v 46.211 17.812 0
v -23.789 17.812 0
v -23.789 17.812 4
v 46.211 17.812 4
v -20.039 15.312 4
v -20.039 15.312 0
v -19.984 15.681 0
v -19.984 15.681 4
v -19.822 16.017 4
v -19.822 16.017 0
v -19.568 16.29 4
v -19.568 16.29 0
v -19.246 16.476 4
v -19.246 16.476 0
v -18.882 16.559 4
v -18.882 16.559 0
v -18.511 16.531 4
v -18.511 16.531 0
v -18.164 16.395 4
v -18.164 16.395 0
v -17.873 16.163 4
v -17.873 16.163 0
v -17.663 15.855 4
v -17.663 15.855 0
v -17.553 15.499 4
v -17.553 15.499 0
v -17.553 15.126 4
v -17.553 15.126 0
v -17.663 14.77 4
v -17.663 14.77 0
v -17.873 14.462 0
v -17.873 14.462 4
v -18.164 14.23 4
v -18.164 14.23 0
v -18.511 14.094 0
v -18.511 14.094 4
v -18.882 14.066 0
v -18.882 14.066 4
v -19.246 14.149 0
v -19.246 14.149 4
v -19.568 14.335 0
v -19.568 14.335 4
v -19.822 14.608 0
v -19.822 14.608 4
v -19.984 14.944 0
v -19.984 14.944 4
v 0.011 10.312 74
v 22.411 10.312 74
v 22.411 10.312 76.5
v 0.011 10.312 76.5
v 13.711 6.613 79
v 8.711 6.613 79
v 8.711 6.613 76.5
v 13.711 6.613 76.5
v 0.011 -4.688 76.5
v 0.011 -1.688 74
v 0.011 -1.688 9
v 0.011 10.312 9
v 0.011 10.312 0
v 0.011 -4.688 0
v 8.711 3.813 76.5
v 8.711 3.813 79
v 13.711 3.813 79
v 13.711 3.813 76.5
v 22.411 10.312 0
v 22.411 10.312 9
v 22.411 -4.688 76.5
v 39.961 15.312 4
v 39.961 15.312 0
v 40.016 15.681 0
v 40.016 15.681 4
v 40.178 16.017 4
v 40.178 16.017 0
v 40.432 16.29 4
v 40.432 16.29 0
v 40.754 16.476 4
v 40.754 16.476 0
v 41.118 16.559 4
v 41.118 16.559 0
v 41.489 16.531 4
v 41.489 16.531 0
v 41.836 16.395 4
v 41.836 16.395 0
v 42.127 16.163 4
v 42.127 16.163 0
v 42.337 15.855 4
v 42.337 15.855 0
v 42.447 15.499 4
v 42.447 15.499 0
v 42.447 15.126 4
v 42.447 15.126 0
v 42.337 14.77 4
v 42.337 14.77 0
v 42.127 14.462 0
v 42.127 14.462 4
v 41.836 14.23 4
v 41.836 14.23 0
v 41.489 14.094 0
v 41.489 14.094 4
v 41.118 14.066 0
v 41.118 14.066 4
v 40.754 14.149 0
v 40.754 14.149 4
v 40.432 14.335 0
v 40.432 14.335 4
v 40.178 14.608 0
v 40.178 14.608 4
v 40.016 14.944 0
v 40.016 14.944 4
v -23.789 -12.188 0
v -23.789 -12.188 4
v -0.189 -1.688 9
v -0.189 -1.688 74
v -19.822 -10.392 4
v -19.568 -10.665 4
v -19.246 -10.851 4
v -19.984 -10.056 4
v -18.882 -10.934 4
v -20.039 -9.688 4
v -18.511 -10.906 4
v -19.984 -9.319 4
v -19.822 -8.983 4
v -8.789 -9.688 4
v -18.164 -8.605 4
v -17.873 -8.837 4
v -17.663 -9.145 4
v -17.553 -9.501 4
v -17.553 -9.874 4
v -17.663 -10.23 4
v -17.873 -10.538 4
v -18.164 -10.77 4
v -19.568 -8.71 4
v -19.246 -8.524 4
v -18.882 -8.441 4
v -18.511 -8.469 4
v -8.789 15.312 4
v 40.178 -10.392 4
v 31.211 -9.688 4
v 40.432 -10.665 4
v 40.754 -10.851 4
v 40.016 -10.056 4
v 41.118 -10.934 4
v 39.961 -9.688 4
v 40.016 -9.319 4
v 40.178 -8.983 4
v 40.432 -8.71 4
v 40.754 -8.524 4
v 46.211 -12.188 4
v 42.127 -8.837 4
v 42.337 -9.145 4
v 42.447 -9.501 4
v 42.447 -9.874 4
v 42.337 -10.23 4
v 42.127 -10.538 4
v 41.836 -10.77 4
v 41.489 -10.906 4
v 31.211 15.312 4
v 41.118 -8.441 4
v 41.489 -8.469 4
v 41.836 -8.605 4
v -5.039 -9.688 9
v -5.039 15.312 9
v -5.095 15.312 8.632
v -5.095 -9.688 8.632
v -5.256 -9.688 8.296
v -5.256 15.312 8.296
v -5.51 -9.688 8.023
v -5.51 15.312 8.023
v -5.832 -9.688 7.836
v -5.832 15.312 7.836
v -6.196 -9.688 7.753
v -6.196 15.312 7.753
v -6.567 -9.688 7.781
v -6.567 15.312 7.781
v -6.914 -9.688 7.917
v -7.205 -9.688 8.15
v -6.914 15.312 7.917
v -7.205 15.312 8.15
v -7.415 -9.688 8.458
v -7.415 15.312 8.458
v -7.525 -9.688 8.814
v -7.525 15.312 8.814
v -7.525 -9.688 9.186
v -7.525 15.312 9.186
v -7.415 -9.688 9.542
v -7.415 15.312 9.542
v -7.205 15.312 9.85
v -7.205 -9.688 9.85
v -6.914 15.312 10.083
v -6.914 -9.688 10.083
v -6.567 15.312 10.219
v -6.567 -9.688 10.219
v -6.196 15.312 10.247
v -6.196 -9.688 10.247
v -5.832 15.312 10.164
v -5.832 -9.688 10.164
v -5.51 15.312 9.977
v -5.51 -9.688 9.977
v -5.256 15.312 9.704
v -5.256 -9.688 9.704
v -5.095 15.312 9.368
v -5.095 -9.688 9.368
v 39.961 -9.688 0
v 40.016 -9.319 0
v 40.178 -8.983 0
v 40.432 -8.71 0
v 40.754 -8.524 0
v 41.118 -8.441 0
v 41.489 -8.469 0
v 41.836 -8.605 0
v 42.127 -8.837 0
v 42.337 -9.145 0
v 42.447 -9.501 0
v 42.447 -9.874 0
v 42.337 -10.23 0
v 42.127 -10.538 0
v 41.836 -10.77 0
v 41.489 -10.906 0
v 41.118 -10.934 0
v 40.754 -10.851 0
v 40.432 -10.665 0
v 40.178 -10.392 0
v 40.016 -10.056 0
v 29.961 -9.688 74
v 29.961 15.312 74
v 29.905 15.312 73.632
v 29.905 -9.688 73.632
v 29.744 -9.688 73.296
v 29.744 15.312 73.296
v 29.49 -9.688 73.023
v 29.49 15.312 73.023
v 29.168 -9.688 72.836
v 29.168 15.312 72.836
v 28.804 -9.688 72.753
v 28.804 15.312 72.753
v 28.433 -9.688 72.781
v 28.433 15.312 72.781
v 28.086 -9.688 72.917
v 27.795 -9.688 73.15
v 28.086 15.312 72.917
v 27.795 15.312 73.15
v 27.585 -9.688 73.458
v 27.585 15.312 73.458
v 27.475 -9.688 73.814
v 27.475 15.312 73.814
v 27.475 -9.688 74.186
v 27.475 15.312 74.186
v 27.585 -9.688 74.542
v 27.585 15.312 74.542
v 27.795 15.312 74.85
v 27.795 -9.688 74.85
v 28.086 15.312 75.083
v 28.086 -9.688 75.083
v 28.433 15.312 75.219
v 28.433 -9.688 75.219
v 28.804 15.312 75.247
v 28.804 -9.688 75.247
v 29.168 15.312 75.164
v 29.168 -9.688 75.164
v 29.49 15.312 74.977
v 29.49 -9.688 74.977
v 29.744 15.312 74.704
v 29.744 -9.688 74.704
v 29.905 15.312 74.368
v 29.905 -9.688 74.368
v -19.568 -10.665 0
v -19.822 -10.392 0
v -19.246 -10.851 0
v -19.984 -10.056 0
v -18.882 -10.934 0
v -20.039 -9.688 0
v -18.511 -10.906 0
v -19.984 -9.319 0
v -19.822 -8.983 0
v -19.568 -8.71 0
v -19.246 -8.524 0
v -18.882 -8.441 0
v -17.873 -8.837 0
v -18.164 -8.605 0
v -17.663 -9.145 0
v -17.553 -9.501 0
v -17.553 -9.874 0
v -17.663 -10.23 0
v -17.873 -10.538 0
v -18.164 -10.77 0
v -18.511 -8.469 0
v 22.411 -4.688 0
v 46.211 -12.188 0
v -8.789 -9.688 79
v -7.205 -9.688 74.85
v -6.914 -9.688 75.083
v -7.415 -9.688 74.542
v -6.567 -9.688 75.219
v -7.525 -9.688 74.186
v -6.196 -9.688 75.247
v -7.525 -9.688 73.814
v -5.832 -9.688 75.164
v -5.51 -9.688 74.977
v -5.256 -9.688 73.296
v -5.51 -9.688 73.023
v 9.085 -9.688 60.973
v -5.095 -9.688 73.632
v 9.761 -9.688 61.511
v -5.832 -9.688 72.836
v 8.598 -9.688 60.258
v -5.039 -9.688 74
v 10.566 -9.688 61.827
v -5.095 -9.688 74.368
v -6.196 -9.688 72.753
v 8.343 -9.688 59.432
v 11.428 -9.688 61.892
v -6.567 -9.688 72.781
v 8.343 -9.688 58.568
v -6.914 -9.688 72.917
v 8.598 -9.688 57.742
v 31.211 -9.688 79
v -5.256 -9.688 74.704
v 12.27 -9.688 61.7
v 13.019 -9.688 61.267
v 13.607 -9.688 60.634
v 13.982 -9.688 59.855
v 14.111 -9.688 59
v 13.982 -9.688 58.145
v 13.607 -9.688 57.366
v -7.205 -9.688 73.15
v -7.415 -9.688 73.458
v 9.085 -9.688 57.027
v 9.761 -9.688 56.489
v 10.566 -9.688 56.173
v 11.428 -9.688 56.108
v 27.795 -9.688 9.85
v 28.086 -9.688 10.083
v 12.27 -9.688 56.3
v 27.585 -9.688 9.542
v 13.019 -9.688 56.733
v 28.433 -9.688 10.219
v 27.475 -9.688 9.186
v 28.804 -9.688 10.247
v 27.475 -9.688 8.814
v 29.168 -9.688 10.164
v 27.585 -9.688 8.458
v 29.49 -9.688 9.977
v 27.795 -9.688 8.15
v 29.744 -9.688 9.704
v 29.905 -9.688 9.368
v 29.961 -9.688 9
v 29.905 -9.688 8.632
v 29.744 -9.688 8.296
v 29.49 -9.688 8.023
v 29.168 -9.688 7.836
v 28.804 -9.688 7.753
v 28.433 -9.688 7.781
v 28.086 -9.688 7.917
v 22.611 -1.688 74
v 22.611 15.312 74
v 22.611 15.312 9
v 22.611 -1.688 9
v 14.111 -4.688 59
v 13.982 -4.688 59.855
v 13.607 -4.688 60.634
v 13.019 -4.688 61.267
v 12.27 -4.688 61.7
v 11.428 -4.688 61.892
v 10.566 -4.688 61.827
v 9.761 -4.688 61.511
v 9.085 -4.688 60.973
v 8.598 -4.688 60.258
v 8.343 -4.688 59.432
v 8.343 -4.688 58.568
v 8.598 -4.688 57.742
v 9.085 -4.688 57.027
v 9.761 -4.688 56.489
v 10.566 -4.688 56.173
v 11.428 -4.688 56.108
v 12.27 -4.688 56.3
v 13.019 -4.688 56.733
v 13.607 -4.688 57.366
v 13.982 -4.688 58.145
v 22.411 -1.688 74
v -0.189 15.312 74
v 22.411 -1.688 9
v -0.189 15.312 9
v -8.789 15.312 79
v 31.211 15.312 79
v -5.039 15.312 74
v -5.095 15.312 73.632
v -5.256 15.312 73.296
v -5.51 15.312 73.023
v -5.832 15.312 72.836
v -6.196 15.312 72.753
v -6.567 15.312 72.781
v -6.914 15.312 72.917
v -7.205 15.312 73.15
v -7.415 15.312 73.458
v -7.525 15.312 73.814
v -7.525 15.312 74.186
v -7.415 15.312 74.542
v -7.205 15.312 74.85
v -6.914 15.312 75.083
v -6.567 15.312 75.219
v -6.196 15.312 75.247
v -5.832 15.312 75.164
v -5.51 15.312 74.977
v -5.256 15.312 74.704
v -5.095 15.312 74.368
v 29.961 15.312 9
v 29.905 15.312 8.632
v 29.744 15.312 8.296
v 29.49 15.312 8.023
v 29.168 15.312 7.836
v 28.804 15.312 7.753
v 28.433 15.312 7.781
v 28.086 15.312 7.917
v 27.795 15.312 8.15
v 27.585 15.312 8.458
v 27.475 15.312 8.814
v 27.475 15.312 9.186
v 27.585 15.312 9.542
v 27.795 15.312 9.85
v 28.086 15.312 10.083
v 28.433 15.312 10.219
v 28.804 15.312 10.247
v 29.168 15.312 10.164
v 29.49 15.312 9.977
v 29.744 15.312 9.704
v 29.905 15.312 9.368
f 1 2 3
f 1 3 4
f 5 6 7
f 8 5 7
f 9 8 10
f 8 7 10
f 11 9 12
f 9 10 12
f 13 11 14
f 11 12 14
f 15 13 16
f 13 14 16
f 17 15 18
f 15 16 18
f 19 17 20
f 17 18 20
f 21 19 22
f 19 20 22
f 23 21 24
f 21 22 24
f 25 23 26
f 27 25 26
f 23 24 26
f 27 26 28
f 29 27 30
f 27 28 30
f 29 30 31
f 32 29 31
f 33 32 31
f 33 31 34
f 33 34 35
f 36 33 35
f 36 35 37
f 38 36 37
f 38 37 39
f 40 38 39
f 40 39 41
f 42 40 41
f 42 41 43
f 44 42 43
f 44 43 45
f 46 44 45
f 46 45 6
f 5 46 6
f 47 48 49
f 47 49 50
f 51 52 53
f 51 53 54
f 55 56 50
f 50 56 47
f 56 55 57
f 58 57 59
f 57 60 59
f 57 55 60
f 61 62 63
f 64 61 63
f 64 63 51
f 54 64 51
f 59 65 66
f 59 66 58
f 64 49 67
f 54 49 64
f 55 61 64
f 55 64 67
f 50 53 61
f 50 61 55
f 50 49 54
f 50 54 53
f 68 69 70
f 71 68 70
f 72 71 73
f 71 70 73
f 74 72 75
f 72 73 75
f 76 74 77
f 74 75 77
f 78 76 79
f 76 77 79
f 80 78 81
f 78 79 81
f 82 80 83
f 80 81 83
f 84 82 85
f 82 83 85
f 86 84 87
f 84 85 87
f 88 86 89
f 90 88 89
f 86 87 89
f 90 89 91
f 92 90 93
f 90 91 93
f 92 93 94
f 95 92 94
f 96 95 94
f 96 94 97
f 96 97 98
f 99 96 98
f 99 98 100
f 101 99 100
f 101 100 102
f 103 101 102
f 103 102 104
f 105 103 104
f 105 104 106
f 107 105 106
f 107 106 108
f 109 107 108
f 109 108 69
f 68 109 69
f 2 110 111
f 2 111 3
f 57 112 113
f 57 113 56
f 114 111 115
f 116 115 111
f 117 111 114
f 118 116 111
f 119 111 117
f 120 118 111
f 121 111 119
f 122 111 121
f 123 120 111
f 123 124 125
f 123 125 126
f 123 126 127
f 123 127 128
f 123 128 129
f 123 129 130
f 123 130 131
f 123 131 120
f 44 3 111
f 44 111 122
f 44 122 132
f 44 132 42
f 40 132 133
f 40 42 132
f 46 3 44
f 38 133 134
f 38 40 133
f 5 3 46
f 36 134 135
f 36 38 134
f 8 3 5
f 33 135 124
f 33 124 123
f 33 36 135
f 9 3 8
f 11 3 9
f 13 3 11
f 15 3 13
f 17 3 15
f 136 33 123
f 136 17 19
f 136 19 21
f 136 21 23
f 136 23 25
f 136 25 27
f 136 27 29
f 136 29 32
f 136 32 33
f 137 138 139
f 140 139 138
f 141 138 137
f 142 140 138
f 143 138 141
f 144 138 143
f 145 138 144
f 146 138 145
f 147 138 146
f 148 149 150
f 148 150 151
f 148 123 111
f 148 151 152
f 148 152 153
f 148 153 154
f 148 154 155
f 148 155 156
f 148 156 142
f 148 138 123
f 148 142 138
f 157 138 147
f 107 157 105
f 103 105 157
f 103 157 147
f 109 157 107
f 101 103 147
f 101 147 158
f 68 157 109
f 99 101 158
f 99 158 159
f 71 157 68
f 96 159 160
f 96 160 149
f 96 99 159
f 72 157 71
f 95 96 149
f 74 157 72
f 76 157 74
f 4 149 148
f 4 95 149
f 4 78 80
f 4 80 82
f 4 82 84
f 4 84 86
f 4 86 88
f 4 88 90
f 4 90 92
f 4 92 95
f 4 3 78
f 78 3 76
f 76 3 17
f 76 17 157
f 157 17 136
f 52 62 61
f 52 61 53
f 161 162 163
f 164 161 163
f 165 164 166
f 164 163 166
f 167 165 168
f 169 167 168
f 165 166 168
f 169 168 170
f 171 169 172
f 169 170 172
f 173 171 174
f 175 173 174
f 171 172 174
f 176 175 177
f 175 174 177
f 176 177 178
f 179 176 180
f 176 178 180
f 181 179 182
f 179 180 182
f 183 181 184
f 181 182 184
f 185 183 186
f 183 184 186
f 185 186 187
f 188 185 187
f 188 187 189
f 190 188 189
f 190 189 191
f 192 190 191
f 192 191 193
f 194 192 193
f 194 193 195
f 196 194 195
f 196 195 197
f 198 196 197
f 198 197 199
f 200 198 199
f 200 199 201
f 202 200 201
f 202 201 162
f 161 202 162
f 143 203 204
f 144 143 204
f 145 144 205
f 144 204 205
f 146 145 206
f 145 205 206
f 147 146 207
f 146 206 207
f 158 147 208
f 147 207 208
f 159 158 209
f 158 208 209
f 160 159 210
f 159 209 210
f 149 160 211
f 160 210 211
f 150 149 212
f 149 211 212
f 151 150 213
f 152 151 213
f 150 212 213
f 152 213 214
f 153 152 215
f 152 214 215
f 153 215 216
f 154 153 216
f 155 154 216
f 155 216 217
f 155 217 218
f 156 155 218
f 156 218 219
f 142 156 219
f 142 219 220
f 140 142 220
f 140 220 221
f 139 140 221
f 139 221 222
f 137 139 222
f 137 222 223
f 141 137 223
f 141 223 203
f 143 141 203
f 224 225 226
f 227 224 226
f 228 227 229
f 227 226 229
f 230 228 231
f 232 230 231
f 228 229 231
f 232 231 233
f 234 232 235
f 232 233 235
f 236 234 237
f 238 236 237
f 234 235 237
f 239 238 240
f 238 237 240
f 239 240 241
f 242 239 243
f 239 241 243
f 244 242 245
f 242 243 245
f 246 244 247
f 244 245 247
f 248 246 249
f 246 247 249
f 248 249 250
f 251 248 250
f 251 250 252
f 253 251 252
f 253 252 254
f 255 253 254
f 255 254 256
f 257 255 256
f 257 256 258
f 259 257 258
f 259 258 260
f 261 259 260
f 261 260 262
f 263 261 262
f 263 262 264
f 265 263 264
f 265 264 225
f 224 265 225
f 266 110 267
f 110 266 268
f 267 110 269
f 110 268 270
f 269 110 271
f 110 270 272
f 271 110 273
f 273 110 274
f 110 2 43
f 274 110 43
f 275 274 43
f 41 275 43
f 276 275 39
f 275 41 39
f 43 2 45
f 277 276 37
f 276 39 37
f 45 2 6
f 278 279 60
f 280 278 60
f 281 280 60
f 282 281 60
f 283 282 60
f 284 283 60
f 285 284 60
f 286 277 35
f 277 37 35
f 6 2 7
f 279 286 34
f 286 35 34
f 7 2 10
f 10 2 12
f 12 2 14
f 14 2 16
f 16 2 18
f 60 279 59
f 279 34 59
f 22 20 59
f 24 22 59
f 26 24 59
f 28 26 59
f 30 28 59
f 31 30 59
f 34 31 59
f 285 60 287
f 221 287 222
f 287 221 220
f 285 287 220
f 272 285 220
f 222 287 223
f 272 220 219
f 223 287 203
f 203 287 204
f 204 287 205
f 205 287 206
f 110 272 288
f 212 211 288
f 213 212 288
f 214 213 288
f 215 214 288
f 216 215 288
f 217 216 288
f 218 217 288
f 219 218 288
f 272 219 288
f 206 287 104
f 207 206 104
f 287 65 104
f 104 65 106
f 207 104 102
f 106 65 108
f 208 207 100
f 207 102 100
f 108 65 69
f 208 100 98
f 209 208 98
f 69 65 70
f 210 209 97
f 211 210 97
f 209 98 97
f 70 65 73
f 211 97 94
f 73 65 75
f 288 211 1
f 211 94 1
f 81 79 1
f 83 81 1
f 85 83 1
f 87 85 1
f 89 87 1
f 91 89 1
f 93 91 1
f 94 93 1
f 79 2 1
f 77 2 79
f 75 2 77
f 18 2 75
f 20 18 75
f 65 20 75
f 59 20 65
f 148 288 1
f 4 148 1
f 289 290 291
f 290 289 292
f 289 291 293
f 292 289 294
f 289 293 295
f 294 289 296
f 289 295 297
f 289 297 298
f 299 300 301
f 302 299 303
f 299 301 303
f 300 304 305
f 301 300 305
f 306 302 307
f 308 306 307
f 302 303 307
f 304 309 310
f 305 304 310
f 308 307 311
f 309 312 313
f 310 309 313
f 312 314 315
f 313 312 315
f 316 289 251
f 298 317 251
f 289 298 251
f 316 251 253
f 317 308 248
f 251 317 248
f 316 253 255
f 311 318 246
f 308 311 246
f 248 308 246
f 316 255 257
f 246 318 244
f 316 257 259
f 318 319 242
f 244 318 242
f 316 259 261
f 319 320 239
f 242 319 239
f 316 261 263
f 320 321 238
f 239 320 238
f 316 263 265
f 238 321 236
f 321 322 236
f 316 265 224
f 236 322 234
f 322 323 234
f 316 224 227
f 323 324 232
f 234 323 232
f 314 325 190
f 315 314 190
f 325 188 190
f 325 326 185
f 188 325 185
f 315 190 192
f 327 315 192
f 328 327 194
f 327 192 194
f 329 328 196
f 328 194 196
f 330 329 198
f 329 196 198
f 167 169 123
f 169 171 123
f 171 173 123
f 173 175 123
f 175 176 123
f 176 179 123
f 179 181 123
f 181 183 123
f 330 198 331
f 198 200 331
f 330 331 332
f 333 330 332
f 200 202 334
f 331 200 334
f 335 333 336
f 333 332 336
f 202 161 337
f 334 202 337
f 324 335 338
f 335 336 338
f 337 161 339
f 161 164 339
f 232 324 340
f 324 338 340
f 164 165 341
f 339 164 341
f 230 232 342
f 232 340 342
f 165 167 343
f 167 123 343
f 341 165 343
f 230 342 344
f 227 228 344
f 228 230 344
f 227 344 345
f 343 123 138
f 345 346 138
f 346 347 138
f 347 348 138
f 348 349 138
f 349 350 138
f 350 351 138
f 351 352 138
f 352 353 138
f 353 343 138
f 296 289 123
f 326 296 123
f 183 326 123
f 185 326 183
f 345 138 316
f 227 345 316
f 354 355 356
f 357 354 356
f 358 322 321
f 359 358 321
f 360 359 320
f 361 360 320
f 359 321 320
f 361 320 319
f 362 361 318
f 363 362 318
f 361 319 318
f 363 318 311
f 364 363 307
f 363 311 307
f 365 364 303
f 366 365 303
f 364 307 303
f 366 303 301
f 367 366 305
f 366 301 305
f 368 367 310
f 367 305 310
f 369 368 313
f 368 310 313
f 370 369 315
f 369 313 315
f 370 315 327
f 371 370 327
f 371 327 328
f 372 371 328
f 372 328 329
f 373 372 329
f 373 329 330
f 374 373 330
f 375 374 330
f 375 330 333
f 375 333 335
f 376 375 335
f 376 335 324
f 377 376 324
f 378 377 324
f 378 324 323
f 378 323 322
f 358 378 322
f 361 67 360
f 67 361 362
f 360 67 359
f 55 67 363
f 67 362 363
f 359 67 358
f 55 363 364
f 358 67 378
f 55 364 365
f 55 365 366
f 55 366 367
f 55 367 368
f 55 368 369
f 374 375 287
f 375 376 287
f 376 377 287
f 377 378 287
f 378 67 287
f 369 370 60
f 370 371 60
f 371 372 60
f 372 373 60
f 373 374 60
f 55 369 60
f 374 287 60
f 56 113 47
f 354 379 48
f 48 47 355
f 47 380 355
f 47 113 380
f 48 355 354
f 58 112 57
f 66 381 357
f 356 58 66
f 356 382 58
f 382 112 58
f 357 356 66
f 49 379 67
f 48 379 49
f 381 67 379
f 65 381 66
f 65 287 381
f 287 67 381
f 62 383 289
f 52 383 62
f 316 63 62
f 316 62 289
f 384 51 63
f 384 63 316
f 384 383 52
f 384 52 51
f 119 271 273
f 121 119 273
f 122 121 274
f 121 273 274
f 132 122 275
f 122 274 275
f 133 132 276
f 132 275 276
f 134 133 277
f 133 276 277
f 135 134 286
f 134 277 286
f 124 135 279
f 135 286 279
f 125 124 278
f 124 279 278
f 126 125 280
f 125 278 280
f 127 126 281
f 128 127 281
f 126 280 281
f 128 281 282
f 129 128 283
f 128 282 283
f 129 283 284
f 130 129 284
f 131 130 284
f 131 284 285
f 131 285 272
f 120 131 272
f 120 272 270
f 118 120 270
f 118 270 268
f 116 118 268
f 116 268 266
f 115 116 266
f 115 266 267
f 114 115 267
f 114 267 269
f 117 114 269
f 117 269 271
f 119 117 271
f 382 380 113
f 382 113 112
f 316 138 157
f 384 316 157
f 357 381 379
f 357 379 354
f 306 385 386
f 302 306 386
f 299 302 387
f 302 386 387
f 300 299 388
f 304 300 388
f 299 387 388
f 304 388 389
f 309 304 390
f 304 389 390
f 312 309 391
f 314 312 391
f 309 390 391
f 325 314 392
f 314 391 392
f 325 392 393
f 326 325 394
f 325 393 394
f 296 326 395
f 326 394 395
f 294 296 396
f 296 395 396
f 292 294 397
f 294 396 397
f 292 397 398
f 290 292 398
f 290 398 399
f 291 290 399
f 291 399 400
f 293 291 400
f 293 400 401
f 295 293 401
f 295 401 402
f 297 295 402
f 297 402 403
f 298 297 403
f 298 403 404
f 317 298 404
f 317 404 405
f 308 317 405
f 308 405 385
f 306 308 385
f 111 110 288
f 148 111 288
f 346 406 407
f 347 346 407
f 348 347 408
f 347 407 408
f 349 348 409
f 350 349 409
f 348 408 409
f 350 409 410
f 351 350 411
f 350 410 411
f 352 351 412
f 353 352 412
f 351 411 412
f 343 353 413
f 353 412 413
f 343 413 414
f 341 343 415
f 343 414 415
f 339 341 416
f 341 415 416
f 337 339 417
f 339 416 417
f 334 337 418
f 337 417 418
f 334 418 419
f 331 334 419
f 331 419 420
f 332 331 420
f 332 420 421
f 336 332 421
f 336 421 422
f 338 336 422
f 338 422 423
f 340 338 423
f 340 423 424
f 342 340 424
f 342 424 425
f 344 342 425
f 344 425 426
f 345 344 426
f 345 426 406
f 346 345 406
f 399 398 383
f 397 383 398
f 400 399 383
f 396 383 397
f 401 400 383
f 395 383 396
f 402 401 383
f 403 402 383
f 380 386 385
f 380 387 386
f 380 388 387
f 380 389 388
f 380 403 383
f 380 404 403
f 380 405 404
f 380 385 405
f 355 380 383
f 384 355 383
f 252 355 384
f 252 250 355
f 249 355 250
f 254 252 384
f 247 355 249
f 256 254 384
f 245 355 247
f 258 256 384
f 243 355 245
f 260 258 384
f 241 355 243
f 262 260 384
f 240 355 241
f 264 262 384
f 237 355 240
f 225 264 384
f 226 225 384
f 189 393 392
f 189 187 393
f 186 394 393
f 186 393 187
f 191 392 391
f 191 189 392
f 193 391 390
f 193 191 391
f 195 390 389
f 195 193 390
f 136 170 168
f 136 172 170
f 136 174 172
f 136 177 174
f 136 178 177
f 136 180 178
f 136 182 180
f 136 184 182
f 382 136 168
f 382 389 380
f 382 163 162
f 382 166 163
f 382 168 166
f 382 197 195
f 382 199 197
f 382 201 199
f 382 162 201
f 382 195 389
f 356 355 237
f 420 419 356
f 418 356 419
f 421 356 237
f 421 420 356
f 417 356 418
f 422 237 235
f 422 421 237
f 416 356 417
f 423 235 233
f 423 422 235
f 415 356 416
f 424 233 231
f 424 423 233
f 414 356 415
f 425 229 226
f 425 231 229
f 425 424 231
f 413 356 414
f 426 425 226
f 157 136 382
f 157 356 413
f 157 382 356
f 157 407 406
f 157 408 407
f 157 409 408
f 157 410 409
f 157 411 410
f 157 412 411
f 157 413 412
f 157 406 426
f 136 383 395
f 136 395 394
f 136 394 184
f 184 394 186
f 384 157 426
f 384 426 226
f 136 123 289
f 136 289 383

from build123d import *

# Parameters (mm, degrees)
SKETCH2_W           = 70
SKETCH2_H           = 30
BOSS_EXTRUDE1_DEPTH = 4
SKETCH4_W           = 40
SKETCH4_H           = 25
BOSS_EXTRUDE7_DEPTH = 75
SKETCH6_W           = 22.4
SKETCH6_H           = 15
CUT_EXTRUDE13_DEPTH = 76.5
SKETCH8_W           = 22.8
SKETCH8_H           = 65
CUT_EXTRUDE14_DEPTH = 17
SKETCH9_R           = 1.25
CUT_EXTRUDE15_DEPTH = 28.5
SKETCH10_R          = 2.9
CUT_EXTRUDE18_DEPTH = 10
SKETCH11_W          = 5
SKETCH11_H          = 2.8
CUT_EXTRUDE17_DEPTH = 10
SKETCH12_R          = 1.25
CUT_EXTRUDE20_DEPTH = 10


with BuildPart() as part:
    # Sketch2 → Boss-Extrude1 (new body)
    with BuildSketch(Plane.XY):
        with Locations((11.210953405, 2.8125)):
            Rectangle(SKETCH2_W, SKETCH2_H)
    extrude(amount=BOSS_EXTRUDE1_DEPTH)

    # Sketch4 → Boss-Extrude7 (add)
    with BuildSketch(Plane.XY.offset(4)):
        with Locations((11.210953405, 2.8125)):
            Rectangle(SKETCH4_W, SKETCH4_H)
    extrude(amount=BOSS_EXTRUDE7_DEPTH)

    # Sketch6 → Cut-Extrude13 (cut)
    with BuildSketch(Plane(origin=(0, 0, 0), x_dir=(-1, 0, 0), z_dir=(0, 0, -1))):
        with Locations((-11.210953405, 2.8125)):
            Rectangle(SKETCH6_W, SKETCH6_H)
    extrude(amount=-CUT_EXTRUDE13_DEPTH, mode=Mode.SUBTRACT)

    # Sketch8 → Cut-Extrude14 (cut)
    with BuildSketch(Plane(origin=(0, 15.3125, 0), x_dir=(1, 0, 0), z_dir=(0, 1, 0))):
        with Locations((11.210953405, -41.5)):
            Rectangle(SKETCH8_W, SKETCH8_H)
    extrude(amount=-CUT_EXTRUDE14_DEPTH, mode=Mode.SUBTRACT)

    # Sketch9 → Cut-Extrude15 (cut, through all)
    with BuildSketch(Plane(origin=(0, 15.3125, 0), x_dir=(1, 0, 0), z_dir=(0, 1, 0))):
        with Locations((-6.289046595, -9)):
            Circle(SKETCH9_R)
        with Locations((28.710953405, -9)):
            Circle(SKETCH9_R)
        with Locations((-6.289046595, -74)):
            Circle(SKETCH9_R)
        with Locations((28.710953405, -74)):
            Circle(SKETCH9_R)
    extrude(amount=-CUT_EXTRUDE15_DEPTH, mode=Mode.SUBTRACT)

    # Sketch10 → Cut-Extrude18 (cut)
    with BuildSketch(Plane.XZ.offset(9.6875)):
        with Locations((11.210953405, 59)):
            Circle(SKETCH10_R)
    extrude(amount=-CUT_EXTRUDE18_DEPTH, mode=Mode.SUBTRACT)

    # Sketch11 → Cut-Extrude17 (cut)
    with BuildSketch(Plane.XY.offset(79)):
        with Locations((11.210953405, 5.2125)):
            Rectangle(SKETCH11_W, SKETCH11_H)
    extrude(amount=-CUT_EXTRUDE17_DEPTH, mode=Mode.SUBTRACT)

    # Sketch12 → Cut-Extrude20 (cut)
    with BuildSketch(Plane(origin=(0, 0, 0), x_dir=(-1, 0, 0), z_dir=(0, 0, -1))):
        with Locations((-41.210953405, 15.3125)):
            Circle(SKETCH12_R)
        with Locations((18.789046595, 15.3125)):
            Circle(SKETCH12_R)
        with Locations((18.789046595, -9.6875)):
            Circle(SKETCH12_R)
        with Locations((-41.210953405, -9.6875)):
            Circle(SKETCH12_R)
    extrude(amount=-CUT_EXTRUDE20_DEPTH, mode=Mode.SUBTRACT)


solid = part.part
